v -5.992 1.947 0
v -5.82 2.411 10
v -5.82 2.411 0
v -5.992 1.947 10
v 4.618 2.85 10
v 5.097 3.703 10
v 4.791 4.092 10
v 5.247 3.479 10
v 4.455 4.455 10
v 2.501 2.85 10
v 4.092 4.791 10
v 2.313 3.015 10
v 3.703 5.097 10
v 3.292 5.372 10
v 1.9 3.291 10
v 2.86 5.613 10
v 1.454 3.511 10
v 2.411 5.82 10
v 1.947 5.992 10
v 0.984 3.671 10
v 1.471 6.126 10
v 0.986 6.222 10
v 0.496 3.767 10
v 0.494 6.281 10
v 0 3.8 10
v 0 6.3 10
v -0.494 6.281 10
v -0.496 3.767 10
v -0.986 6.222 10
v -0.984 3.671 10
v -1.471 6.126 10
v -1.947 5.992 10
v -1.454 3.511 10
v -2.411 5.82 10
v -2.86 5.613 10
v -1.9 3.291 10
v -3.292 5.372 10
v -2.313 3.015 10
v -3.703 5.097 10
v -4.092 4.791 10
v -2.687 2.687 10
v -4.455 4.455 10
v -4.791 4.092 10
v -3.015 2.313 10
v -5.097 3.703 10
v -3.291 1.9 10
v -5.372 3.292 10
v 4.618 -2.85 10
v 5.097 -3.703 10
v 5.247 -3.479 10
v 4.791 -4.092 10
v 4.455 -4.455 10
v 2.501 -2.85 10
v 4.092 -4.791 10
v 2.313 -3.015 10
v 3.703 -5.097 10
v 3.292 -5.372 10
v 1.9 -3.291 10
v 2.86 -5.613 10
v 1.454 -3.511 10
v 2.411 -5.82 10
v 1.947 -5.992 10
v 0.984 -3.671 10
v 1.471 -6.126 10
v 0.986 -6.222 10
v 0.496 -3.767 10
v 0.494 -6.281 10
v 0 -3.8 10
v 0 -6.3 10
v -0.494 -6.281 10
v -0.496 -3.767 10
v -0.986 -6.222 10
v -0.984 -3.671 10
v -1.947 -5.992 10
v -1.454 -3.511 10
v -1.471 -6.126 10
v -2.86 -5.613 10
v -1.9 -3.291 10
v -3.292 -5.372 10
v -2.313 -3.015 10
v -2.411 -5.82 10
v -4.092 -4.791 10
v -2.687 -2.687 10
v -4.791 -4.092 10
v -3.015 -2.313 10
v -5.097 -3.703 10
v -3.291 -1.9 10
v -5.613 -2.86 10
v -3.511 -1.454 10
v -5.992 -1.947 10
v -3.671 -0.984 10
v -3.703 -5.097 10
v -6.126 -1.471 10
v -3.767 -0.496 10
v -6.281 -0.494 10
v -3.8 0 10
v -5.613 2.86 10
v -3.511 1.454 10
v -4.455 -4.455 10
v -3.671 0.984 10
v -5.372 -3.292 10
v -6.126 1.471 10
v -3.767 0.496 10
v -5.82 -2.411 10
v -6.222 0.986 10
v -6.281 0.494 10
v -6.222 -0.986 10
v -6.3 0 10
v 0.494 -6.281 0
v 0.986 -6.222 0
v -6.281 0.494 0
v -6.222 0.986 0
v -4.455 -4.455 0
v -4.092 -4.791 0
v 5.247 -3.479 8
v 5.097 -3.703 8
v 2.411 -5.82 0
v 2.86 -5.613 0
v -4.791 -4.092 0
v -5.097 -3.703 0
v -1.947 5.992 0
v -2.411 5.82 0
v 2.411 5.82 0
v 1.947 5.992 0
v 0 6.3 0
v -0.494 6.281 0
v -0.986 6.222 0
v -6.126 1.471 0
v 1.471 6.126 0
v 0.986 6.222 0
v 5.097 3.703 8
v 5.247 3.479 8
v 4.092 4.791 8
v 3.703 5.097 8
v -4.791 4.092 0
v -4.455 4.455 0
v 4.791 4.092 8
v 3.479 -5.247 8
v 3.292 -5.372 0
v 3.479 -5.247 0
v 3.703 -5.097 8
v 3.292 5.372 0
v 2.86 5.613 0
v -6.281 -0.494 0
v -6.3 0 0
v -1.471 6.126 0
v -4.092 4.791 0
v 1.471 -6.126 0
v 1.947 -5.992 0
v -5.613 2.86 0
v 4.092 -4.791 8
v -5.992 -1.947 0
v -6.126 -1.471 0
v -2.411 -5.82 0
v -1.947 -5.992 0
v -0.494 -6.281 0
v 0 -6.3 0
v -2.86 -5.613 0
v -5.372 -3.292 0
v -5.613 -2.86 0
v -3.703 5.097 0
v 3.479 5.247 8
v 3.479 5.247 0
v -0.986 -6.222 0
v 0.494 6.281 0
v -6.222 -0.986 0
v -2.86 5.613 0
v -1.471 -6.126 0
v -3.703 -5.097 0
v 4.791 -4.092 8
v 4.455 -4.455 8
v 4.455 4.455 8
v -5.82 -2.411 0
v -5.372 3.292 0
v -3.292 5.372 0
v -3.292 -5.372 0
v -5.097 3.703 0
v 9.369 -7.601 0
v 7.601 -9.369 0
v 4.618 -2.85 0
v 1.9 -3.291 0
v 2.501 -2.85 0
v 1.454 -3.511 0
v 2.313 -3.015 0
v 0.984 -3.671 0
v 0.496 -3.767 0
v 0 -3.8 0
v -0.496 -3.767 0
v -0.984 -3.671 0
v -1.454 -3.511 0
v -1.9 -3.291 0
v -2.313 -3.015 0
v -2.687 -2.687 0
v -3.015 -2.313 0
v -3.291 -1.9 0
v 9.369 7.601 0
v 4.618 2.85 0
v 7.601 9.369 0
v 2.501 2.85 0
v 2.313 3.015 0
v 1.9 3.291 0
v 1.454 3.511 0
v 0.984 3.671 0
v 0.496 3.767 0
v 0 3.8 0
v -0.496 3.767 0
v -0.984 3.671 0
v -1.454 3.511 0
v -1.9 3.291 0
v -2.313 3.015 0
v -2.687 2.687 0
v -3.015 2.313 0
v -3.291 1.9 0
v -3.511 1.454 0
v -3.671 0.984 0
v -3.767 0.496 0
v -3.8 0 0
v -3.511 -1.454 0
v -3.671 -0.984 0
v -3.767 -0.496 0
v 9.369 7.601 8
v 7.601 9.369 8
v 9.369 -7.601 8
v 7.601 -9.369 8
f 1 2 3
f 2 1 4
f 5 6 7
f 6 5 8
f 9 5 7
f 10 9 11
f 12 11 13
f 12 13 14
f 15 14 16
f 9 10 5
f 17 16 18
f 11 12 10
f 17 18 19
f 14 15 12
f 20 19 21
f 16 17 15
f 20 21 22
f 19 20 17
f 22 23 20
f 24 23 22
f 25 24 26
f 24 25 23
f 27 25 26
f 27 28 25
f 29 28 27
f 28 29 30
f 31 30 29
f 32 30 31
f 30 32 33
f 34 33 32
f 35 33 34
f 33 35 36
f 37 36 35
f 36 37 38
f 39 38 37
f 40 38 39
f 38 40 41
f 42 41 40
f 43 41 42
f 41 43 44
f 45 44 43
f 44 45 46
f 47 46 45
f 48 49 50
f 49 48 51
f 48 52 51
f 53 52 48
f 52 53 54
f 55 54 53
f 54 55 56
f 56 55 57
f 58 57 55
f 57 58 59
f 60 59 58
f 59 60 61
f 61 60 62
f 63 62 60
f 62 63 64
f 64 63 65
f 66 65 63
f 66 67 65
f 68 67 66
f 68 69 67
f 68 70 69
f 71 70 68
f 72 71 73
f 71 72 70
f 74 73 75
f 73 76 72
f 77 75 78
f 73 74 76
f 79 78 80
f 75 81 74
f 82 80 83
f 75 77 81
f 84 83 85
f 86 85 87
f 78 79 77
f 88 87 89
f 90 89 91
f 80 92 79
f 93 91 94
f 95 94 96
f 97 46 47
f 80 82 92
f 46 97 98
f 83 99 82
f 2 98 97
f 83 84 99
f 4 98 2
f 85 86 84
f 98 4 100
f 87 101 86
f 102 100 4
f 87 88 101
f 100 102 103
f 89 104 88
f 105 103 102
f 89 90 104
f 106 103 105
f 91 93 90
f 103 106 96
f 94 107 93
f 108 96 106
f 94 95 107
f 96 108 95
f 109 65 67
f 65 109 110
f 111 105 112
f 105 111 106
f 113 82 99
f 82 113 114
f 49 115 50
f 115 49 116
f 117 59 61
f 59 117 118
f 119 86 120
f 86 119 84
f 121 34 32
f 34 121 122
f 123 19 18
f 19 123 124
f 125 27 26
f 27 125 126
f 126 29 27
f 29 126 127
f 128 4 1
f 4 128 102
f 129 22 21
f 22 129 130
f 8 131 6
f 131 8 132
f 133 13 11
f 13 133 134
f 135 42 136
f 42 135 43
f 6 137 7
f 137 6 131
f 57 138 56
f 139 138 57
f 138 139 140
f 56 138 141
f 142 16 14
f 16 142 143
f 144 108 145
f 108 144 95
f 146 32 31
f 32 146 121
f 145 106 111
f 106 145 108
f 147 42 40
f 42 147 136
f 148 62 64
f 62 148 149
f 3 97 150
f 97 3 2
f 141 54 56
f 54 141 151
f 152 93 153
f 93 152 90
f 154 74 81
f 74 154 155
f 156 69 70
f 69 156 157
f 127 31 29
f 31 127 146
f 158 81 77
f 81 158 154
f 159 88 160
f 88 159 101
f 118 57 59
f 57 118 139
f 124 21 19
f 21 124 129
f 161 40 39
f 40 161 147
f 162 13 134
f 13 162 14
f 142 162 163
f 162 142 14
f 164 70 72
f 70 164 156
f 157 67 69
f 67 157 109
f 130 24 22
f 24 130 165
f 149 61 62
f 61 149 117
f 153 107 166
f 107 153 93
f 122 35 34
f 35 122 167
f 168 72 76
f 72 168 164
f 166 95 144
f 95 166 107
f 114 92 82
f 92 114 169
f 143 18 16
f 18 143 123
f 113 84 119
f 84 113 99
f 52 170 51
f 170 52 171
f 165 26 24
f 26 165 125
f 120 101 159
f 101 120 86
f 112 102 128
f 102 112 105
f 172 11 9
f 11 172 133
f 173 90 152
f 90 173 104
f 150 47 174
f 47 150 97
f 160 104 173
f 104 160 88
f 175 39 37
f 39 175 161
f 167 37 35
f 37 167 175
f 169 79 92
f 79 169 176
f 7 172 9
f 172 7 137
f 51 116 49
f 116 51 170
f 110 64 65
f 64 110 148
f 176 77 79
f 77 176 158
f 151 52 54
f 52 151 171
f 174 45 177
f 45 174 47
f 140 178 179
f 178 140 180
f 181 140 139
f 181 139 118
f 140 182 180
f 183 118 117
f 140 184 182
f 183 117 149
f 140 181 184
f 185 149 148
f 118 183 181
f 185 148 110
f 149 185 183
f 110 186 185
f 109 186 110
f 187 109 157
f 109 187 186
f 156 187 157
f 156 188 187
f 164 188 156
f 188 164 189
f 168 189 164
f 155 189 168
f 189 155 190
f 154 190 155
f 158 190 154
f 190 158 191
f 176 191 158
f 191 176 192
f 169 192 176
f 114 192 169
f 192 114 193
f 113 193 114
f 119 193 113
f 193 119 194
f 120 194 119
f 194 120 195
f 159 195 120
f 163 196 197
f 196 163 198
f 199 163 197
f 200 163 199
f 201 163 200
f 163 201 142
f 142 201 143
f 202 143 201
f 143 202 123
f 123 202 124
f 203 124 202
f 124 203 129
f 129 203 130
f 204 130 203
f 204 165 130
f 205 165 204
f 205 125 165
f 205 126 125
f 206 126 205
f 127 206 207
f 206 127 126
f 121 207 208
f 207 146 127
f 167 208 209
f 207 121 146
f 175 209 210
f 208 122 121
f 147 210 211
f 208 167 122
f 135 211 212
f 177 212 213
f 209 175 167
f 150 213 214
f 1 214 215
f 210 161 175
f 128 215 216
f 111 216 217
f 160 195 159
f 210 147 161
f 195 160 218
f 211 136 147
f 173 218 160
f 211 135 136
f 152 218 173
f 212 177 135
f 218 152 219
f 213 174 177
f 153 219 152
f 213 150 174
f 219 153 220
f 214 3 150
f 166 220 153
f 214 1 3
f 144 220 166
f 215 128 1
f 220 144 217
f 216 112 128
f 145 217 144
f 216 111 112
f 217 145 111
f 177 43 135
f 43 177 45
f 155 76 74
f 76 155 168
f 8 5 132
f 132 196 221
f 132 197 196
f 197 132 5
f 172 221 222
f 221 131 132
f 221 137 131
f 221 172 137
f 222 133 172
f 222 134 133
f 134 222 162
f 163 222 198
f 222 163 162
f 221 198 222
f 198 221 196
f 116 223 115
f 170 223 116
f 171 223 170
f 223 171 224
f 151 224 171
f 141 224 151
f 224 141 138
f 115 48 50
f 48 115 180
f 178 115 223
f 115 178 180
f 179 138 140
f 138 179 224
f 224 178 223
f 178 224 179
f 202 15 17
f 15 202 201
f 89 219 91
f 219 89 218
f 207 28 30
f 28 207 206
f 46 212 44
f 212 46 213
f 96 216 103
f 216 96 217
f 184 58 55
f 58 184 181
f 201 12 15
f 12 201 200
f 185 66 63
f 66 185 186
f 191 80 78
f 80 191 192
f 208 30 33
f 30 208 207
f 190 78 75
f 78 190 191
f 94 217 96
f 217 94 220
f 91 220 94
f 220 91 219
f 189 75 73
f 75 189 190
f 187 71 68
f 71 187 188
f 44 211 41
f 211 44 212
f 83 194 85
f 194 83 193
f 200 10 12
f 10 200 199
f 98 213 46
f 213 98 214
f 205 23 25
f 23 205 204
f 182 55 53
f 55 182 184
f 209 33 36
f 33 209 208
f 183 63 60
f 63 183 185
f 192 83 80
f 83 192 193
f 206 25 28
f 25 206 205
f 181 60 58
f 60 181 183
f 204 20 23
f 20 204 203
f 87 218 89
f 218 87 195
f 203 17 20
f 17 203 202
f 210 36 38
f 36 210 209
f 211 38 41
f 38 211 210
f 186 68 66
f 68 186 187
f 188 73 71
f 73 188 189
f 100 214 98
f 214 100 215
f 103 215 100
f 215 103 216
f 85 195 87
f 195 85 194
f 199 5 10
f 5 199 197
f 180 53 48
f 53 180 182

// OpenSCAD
// washer dimentions
id = 7.6;
width = 2.5;
h = 10;
tabl = 8;

$fa=.5;
$fs = .5;

od = id + 2*width;


difference(){

	x = tabl/sqrt(2);
	
	union(){
		translate([0,0,h/2]) cylinder(r=od/2,h=h,center=true);
		translate([x,x,(h-2)/2]) rotate([0,0,-45]) cube([width,tabl,h-2],center=true);
		translate([x,-x,(h-2)/2]) rotate([0,0,45]) cube([width,tabl,h-2],center=true);
		}
		translate([0,0,h/2]) cylinder(r=id/2,h=h+1,center=true);
		translate([tabl/2,0,h/2]) rotate([0,0,0]) cube([tabl,id*.75,h+2],center=true);

		translate([((2*tabl+width)/sqrt(2)),0,h/2]) rotate([0,0,45]) cube([2*tabl,2*tabl,h+2],center=true);	
	
}
